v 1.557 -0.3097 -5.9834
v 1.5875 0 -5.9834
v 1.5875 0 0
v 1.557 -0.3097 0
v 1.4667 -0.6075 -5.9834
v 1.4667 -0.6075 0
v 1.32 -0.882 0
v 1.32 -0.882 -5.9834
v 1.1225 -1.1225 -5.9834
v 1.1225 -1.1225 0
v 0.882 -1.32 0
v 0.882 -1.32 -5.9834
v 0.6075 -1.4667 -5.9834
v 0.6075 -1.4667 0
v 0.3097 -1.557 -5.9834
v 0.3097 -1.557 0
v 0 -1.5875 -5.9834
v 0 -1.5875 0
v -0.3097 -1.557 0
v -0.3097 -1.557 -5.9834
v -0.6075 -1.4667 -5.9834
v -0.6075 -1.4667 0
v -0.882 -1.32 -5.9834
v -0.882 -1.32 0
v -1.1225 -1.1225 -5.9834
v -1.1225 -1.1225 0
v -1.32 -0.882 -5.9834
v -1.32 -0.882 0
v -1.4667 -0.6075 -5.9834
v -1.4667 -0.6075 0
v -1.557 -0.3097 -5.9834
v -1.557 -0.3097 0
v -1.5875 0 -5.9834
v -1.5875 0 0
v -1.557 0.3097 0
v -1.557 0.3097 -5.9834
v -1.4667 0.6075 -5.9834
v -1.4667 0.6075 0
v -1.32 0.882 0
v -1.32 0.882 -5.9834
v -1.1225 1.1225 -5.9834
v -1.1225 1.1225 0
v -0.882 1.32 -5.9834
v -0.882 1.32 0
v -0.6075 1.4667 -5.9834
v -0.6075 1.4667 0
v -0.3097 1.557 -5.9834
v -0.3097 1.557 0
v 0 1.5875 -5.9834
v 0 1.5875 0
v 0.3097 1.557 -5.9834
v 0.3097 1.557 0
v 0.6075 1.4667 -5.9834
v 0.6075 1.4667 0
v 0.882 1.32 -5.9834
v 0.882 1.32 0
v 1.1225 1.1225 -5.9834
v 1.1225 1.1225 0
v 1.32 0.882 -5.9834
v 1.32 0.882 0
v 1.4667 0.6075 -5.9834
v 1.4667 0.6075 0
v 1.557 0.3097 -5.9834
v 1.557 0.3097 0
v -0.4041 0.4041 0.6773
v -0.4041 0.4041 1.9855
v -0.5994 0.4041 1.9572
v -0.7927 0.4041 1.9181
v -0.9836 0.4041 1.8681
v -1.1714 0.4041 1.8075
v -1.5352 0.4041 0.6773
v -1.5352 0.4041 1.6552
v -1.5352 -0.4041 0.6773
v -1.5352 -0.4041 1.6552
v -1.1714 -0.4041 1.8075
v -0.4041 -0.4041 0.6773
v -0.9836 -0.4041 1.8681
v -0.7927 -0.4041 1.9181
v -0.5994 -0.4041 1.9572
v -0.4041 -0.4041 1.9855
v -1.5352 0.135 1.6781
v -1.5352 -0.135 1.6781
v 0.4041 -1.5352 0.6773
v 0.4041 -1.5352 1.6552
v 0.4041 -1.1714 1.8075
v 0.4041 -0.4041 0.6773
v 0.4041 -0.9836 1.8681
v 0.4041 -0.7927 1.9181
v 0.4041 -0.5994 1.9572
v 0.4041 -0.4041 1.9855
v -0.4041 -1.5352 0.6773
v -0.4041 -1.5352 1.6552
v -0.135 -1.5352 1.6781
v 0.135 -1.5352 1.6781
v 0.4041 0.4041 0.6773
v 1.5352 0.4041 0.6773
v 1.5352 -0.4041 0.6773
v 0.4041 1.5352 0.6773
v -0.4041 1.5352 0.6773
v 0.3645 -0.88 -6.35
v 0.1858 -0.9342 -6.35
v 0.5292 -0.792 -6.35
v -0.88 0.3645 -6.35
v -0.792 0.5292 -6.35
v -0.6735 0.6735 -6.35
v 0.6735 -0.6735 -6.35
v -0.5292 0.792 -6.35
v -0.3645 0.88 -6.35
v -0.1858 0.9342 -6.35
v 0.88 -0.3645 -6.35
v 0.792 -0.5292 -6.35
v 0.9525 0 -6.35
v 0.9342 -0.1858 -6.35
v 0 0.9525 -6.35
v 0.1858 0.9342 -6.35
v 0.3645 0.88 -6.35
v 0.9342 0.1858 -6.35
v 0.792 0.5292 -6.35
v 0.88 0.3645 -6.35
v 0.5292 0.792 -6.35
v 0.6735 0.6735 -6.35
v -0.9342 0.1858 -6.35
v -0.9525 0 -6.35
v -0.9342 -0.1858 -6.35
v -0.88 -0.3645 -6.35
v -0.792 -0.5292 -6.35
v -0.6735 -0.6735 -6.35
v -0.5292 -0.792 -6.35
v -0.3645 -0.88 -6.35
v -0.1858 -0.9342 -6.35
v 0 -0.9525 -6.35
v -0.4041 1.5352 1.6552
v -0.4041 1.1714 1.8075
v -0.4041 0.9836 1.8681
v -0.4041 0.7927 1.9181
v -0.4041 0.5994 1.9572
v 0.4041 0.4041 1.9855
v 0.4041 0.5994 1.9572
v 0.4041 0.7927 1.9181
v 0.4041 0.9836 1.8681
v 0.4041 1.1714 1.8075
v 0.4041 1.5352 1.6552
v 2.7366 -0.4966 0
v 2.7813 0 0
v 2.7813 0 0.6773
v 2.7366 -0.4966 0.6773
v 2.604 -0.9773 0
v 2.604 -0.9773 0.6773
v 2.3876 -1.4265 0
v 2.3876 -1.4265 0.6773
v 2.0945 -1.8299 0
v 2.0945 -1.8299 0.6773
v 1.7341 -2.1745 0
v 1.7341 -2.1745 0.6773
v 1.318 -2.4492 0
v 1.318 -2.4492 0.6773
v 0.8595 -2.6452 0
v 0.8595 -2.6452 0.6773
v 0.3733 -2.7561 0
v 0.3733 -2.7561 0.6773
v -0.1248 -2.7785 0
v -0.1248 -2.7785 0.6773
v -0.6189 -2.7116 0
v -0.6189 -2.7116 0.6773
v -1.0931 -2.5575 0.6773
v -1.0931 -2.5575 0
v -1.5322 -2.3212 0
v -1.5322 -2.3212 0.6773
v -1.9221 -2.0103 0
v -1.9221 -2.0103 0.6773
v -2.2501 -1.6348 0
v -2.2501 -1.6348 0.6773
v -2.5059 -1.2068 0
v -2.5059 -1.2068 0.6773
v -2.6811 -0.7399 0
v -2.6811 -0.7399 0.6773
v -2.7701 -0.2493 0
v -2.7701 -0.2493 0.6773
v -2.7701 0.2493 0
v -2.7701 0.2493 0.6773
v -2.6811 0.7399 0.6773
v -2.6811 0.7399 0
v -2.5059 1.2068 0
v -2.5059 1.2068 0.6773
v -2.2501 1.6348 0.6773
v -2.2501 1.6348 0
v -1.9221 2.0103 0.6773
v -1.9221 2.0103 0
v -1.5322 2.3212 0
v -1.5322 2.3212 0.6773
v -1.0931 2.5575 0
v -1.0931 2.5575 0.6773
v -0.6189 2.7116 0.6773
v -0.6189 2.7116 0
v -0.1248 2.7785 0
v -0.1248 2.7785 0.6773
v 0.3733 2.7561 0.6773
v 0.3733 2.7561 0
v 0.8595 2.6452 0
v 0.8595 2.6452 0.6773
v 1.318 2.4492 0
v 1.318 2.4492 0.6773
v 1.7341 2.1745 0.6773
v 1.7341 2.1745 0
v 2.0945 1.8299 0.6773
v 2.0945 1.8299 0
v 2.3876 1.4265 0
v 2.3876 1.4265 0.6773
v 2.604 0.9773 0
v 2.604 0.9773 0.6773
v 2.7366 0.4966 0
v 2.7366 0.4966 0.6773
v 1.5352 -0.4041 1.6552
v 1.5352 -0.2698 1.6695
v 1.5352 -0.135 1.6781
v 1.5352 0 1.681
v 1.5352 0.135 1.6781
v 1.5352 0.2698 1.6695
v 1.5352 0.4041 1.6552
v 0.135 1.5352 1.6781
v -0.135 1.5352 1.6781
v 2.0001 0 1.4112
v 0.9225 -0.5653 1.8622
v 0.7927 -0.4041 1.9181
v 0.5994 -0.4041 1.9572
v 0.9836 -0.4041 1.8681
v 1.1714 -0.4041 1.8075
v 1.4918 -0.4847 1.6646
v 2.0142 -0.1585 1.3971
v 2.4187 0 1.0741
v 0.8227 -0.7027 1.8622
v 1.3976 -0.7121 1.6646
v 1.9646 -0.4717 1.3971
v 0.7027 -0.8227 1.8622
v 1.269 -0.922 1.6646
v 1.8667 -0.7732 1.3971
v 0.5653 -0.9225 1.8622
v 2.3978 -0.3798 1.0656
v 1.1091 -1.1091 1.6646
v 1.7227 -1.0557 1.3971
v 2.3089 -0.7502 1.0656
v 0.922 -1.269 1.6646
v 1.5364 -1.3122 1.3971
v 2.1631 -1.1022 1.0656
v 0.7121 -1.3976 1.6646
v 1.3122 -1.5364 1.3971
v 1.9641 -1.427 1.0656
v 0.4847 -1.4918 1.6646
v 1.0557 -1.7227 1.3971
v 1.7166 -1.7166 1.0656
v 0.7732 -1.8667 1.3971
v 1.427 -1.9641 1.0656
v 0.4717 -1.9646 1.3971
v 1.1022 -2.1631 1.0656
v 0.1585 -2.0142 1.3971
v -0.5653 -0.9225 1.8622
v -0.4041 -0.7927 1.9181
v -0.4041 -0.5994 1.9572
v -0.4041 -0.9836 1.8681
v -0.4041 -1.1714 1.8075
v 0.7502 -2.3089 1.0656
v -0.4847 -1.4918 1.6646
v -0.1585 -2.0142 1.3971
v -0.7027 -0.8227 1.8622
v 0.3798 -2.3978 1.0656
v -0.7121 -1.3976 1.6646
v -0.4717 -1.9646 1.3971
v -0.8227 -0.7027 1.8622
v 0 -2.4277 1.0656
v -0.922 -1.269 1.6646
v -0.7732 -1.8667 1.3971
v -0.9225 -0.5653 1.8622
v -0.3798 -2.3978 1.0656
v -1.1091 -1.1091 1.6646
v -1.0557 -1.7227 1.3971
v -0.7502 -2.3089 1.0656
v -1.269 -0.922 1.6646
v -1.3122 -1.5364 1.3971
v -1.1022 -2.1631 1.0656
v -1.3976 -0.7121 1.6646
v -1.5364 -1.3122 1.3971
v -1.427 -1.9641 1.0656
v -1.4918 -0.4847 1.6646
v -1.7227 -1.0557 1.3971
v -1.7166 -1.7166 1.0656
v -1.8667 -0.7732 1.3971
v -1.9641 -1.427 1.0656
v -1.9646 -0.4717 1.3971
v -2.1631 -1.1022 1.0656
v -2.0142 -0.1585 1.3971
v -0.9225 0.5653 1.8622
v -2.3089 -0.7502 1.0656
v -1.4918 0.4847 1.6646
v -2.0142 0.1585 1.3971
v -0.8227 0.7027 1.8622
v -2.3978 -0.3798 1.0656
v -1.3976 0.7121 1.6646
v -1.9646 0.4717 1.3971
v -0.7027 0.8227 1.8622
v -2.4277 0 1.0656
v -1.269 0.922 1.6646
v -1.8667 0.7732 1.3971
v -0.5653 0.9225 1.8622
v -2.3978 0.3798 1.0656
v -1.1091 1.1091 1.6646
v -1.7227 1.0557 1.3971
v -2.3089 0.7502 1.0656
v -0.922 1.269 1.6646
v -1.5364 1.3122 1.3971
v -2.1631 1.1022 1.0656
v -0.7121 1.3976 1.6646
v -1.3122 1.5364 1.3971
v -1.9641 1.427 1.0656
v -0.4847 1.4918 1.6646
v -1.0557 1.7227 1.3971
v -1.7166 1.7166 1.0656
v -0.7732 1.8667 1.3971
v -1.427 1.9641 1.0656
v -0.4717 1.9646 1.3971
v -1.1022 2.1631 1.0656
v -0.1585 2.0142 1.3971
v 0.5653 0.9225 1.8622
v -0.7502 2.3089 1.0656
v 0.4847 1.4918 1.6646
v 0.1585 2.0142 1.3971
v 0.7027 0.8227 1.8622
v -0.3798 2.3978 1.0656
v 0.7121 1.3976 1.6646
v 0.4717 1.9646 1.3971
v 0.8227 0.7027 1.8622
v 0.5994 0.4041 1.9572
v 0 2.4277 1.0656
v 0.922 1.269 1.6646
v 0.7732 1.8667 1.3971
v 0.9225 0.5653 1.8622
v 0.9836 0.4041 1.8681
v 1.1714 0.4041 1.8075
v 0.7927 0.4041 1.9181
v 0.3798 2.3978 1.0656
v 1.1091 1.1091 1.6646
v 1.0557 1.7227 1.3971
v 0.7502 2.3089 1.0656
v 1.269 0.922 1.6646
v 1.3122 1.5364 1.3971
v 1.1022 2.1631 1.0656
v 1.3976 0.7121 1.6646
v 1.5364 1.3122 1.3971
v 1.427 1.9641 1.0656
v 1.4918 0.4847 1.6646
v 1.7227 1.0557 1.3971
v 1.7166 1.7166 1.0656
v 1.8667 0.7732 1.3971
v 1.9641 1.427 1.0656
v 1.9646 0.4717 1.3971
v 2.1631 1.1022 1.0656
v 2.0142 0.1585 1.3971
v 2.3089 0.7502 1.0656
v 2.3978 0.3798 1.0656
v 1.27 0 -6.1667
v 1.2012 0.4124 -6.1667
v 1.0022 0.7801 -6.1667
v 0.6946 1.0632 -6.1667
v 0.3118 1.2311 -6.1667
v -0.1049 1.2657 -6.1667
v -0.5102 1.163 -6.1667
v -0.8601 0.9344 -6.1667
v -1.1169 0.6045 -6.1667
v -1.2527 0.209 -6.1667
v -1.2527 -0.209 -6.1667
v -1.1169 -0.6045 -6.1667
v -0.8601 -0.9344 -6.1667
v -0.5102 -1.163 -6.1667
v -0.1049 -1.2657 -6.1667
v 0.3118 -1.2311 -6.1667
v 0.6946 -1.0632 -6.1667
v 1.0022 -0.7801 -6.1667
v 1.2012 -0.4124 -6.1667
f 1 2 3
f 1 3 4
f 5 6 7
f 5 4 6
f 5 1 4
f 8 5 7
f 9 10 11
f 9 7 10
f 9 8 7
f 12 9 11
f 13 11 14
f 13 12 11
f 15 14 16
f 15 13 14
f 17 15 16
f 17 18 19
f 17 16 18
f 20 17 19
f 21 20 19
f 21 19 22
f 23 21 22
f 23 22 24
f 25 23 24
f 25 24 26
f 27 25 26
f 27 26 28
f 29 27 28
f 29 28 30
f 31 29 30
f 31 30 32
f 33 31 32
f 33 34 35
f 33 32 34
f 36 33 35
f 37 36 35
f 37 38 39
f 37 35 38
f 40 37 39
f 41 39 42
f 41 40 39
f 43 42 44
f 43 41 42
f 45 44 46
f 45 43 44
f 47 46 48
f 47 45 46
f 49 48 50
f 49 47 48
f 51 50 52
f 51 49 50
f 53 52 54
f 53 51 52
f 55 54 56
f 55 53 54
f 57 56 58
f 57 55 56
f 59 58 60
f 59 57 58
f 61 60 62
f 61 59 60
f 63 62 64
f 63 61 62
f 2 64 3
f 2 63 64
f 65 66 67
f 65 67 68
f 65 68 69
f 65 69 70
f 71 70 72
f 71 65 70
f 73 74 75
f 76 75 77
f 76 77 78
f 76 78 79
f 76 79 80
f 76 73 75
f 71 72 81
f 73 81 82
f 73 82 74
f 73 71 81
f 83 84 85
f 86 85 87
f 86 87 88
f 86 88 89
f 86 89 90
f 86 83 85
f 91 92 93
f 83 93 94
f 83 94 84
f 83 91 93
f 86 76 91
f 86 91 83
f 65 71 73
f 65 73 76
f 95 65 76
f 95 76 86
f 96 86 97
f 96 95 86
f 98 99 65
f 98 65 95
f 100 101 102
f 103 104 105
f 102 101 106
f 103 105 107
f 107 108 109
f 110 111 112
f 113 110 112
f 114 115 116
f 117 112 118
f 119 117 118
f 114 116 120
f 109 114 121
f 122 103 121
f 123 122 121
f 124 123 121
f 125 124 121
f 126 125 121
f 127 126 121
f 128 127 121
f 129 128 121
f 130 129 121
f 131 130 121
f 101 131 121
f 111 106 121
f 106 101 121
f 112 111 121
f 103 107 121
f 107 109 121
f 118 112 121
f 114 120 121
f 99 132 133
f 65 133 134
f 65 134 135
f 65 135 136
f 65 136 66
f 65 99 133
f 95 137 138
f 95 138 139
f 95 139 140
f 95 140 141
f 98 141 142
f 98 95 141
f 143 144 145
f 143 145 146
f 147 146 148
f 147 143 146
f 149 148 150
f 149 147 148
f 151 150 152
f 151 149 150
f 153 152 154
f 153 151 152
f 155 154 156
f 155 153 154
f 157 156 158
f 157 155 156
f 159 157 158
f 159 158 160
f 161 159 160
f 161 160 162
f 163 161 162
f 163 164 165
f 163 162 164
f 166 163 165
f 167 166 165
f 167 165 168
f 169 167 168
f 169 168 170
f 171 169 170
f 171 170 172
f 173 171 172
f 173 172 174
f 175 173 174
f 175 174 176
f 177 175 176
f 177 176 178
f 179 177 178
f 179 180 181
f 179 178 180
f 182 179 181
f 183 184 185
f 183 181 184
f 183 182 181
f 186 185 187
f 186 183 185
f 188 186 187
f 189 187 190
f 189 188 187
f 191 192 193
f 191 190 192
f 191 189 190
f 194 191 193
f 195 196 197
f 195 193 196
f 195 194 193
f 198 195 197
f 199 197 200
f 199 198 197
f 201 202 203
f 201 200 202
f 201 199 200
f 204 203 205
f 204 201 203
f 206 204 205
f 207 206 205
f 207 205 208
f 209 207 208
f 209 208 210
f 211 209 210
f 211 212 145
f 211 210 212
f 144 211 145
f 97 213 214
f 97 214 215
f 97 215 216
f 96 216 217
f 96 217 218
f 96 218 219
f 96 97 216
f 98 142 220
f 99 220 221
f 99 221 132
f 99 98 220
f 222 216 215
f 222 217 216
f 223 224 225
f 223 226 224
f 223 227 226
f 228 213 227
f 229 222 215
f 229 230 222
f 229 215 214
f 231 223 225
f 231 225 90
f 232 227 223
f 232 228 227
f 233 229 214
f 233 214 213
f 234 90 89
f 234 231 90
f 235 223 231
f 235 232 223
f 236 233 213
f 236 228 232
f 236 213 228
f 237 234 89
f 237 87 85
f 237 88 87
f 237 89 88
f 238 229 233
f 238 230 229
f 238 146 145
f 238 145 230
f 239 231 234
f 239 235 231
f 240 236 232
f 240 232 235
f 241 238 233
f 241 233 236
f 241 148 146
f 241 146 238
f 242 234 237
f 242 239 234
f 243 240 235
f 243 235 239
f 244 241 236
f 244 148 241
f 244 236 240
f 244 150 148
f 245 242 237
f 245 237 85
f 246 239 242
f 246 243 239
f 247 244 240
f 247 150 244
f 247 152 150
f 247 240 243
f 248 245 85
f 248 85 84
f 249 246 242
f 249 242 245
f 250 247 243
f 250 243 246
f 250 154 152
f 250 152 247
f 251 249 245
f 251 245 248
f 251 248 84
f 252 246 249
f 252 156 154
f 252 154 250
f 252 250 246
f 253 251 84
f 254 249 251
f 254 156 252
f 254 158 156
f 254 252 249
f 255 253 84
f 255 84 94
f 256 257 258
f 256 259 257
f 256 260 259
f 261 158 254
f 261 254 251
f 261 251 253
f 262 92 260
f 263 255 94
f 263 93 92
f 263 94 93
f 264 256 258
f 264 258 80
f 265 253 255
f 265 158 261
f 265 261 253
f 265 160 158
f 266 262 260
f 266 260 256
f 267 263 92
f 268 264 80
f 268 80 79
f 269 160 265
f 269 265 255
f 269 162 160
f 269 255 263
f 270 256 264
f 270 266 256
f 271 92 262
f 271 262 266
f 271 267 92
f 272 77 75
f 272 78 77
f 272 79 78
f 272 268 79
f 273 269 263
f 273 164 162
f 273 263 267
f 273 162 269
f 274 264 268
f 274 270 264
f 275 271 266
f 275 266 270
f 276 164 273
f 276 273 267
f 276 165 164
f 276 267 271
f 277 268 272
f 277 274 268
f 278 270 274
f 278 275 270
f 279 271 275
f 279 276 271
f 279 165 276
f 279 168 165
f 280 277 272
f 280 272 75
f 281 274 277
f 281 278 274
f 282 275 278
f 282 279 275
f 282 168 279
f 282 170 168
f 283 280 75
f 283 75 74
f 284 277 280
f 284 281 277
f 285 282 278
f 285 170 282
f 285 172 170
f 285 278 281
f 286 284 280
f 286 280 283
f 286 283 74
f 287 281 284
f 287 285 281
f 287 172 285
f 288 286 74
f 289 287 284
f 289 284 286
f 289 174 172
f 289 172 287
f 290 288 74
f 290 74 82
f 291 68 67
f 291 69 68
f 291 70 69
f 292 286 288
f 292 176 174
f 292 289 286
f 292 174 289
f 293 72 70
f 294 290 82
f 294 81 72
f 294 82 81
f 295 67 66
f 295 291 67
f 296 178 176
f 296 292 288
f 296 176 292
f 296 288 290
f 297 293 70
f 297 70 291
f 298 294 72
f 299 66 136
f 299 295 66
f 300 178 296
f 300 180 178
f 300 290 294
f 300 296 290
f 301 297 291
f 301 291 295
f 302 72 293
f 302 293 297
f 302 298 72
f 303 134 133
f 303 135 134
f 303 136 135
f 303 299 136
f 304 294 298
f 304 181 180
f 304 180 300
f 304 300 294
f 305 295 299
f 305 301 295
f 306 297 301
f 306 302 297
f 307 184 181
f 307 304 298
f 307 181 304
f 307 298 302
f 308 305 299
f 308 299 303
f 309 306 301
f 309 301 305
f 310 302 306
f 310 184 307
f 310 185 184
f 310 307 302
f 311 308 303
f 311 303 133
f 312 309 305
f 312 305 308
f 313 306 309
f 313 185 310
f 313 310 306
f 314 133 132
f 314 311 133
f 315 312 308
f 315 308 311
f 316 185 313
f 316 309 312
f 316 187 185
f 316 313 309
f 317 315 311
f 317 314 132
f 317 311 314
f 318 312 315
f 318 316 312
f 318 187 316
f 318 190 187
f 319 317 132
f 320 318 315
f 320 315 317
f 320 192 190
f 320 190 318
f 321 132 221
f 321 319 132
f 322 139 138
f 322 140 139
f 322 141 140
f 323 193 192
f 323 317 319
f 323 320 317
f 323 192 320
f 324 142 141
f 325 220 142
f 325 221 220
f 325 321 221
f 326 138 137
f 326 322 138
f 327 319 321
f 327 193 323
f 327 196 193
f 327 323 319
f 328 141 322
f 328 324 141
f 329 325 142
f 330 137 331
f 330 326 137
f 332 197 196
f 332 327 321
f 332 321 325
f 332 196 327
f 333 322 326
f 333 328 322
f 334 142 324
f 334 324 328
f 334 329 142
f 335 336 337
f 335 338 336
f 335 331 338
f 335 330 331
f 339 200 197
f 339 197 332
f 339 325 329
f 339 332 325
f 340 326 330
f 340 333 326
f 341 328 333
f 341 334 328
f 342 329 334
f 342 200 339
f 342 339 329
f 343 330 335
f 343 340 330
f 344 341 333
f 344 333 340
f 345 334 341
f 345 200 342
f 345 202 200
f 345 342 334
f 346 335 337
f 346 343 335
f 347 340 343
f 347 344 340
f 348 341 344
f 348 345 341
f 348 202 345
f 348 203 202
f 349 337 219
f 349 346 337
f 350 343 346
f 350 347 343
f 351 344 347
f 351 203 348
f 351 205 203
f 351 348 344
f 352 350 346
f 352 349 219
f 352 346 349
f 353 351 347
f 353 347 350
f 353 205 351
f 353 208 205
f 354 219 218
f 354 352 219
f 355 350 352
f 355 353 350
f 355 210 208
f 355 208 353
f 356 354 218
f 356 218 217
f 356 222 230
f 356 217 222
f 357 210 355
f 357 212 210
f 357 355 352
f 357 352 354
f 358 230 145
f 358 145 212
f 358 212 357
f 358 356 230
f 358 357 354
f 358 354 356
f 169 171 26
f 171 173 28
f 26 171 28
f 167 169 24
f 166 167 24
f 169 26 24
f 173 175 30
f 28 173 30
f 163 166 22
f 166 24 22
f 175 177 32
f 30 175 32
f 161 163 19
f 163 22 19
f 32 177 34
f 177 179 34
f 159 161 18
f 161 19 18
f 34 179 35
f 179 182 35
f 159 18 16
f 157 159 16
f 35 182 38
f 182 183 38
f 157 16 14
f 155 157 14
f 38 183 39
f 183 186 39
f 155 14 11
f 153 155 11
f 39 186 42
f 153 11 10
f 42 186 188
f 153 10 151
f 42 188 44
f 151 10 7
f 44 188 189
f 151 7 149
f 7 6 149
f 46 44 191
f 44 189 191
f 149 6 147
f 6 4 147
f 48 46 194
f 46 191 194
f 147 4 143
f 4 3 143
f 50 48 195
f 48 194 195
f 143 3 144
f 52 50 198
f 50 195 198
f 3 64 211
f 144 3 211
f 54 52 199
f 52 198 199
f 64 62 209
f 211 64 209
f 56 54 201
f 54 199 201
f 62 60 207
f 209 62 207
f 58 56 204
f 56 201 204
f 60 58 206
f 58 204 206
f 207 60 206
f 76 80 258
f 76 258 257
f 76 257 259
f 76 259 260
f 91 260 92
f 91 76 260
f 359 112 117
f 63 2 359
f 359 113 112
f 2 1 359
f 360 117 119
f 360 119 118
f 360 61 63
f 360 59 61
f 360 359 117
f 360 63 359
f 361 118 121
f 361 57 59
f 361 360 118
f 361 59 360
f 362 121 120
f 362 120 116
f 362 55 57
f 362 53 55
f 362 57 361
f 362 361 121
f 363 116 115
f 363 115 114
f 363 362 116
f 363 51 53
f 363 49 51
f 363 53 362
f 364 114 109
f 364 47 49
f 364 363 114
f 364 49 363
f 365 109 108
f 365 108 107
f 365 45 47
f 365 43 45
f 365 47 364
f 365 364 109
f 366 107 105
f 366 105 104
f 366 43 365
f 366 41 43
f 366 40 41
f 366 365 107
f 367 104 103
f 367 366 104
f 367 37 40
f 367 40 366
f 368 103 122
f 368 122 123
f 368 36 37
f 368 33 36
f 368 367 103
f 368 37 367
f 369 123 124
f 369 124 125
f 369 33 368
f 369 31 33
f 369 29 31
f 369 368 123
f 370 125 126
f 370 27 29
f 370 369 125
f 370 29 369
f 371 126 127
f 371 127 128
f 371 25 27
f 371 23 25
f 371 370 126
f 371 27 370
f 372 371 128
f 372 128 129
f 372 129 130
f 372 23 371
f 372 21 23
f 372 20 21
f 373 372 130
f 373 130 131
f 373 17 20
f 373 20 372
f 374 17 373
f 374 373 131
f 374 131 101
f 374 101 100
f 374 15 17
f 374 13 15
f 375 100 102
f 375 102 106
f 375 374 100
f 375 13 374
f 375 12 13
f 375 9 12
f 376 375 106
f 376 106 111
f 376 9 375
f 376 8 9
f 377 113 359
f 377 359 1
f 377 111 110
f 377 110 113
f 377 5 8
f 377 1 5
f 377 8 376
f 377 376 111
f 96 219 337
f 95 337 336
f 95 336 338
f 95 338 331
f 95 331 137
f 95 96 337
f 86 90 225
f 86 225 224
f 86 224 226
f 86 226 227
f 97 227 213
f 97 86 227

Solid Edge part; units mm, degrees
sketch "Sketch1" plane through (0, 0, 0) normal (0, -1, 0) x (1, 0, 0)
  arc A0 (0, 2.032) -> (2.7813, 0.6773) centre (0, -1.5005) cw
  line L0 (2.7813, 0.6773) -> (2.7813, 0)
  line L1 (2.7813, 0) -> (1.5875, 0)
  line L2 (1.5875, 0) -> (1.5875, -5.9834)
  line L3 (1.5875, -5.9834) -> (0.9525, -6.35)
  line L4 (0.9525, -6.35) -> (0, -6.35)
  dimension "D1" = 6.35
  dimension "D2" = 2.032
  dimension "D3" = 0.6773
revolve "RevolvedProtrusion1" add sketch "Sketch1" angle 360 about axis through (0, 0, 0) along (0, 0, 1)
sketch "Sketch2" plane through (0, 0, 0.6773) normal (0, 0, 1) x (1, 0, 0)
  line L0 (0.4041, -0.4041) -> (1.5352, -0.4041)
  line L1 (1.5352, -0.4041) -> (1.5352, 0.4041)
  line L2 (1.5352, 0.4041) -> (0.4041, 0.4041)
  line L3 (0.4041, 0.4041) -> (0.4041, 1.5352)
  line L4 (0.4041, 1.5352) -> (-0.4041, 1.5352)
  line L5 (-0.4041, 1.5352) -> (-0.4041, 0.4041)
  line L6 (-0.4041, 0.4041) -> (-1.5352, 0.4041)
  line L7 (-1.5352, 0.4041) -> (-1.5352, -0.4041)
  line L8 (-1.5352, -0.4041) -> (-0.4041, -0.4041)
  line L9 (-0.4041, -0.4041) -> (-0.4041, -1.5352)
  line L10 (-0.4041, -1.5352) -> (0.4041, -1.5352)
  line L11 (0.4041, -1.5352) -> (0.4041, -0.4041)
extrude "Cutout1" cut sketch "Sketch2" along normal through all
cosmetic_thread "Thread1" size "#5-40 UNC"
properties material "Acier galvanisé"
